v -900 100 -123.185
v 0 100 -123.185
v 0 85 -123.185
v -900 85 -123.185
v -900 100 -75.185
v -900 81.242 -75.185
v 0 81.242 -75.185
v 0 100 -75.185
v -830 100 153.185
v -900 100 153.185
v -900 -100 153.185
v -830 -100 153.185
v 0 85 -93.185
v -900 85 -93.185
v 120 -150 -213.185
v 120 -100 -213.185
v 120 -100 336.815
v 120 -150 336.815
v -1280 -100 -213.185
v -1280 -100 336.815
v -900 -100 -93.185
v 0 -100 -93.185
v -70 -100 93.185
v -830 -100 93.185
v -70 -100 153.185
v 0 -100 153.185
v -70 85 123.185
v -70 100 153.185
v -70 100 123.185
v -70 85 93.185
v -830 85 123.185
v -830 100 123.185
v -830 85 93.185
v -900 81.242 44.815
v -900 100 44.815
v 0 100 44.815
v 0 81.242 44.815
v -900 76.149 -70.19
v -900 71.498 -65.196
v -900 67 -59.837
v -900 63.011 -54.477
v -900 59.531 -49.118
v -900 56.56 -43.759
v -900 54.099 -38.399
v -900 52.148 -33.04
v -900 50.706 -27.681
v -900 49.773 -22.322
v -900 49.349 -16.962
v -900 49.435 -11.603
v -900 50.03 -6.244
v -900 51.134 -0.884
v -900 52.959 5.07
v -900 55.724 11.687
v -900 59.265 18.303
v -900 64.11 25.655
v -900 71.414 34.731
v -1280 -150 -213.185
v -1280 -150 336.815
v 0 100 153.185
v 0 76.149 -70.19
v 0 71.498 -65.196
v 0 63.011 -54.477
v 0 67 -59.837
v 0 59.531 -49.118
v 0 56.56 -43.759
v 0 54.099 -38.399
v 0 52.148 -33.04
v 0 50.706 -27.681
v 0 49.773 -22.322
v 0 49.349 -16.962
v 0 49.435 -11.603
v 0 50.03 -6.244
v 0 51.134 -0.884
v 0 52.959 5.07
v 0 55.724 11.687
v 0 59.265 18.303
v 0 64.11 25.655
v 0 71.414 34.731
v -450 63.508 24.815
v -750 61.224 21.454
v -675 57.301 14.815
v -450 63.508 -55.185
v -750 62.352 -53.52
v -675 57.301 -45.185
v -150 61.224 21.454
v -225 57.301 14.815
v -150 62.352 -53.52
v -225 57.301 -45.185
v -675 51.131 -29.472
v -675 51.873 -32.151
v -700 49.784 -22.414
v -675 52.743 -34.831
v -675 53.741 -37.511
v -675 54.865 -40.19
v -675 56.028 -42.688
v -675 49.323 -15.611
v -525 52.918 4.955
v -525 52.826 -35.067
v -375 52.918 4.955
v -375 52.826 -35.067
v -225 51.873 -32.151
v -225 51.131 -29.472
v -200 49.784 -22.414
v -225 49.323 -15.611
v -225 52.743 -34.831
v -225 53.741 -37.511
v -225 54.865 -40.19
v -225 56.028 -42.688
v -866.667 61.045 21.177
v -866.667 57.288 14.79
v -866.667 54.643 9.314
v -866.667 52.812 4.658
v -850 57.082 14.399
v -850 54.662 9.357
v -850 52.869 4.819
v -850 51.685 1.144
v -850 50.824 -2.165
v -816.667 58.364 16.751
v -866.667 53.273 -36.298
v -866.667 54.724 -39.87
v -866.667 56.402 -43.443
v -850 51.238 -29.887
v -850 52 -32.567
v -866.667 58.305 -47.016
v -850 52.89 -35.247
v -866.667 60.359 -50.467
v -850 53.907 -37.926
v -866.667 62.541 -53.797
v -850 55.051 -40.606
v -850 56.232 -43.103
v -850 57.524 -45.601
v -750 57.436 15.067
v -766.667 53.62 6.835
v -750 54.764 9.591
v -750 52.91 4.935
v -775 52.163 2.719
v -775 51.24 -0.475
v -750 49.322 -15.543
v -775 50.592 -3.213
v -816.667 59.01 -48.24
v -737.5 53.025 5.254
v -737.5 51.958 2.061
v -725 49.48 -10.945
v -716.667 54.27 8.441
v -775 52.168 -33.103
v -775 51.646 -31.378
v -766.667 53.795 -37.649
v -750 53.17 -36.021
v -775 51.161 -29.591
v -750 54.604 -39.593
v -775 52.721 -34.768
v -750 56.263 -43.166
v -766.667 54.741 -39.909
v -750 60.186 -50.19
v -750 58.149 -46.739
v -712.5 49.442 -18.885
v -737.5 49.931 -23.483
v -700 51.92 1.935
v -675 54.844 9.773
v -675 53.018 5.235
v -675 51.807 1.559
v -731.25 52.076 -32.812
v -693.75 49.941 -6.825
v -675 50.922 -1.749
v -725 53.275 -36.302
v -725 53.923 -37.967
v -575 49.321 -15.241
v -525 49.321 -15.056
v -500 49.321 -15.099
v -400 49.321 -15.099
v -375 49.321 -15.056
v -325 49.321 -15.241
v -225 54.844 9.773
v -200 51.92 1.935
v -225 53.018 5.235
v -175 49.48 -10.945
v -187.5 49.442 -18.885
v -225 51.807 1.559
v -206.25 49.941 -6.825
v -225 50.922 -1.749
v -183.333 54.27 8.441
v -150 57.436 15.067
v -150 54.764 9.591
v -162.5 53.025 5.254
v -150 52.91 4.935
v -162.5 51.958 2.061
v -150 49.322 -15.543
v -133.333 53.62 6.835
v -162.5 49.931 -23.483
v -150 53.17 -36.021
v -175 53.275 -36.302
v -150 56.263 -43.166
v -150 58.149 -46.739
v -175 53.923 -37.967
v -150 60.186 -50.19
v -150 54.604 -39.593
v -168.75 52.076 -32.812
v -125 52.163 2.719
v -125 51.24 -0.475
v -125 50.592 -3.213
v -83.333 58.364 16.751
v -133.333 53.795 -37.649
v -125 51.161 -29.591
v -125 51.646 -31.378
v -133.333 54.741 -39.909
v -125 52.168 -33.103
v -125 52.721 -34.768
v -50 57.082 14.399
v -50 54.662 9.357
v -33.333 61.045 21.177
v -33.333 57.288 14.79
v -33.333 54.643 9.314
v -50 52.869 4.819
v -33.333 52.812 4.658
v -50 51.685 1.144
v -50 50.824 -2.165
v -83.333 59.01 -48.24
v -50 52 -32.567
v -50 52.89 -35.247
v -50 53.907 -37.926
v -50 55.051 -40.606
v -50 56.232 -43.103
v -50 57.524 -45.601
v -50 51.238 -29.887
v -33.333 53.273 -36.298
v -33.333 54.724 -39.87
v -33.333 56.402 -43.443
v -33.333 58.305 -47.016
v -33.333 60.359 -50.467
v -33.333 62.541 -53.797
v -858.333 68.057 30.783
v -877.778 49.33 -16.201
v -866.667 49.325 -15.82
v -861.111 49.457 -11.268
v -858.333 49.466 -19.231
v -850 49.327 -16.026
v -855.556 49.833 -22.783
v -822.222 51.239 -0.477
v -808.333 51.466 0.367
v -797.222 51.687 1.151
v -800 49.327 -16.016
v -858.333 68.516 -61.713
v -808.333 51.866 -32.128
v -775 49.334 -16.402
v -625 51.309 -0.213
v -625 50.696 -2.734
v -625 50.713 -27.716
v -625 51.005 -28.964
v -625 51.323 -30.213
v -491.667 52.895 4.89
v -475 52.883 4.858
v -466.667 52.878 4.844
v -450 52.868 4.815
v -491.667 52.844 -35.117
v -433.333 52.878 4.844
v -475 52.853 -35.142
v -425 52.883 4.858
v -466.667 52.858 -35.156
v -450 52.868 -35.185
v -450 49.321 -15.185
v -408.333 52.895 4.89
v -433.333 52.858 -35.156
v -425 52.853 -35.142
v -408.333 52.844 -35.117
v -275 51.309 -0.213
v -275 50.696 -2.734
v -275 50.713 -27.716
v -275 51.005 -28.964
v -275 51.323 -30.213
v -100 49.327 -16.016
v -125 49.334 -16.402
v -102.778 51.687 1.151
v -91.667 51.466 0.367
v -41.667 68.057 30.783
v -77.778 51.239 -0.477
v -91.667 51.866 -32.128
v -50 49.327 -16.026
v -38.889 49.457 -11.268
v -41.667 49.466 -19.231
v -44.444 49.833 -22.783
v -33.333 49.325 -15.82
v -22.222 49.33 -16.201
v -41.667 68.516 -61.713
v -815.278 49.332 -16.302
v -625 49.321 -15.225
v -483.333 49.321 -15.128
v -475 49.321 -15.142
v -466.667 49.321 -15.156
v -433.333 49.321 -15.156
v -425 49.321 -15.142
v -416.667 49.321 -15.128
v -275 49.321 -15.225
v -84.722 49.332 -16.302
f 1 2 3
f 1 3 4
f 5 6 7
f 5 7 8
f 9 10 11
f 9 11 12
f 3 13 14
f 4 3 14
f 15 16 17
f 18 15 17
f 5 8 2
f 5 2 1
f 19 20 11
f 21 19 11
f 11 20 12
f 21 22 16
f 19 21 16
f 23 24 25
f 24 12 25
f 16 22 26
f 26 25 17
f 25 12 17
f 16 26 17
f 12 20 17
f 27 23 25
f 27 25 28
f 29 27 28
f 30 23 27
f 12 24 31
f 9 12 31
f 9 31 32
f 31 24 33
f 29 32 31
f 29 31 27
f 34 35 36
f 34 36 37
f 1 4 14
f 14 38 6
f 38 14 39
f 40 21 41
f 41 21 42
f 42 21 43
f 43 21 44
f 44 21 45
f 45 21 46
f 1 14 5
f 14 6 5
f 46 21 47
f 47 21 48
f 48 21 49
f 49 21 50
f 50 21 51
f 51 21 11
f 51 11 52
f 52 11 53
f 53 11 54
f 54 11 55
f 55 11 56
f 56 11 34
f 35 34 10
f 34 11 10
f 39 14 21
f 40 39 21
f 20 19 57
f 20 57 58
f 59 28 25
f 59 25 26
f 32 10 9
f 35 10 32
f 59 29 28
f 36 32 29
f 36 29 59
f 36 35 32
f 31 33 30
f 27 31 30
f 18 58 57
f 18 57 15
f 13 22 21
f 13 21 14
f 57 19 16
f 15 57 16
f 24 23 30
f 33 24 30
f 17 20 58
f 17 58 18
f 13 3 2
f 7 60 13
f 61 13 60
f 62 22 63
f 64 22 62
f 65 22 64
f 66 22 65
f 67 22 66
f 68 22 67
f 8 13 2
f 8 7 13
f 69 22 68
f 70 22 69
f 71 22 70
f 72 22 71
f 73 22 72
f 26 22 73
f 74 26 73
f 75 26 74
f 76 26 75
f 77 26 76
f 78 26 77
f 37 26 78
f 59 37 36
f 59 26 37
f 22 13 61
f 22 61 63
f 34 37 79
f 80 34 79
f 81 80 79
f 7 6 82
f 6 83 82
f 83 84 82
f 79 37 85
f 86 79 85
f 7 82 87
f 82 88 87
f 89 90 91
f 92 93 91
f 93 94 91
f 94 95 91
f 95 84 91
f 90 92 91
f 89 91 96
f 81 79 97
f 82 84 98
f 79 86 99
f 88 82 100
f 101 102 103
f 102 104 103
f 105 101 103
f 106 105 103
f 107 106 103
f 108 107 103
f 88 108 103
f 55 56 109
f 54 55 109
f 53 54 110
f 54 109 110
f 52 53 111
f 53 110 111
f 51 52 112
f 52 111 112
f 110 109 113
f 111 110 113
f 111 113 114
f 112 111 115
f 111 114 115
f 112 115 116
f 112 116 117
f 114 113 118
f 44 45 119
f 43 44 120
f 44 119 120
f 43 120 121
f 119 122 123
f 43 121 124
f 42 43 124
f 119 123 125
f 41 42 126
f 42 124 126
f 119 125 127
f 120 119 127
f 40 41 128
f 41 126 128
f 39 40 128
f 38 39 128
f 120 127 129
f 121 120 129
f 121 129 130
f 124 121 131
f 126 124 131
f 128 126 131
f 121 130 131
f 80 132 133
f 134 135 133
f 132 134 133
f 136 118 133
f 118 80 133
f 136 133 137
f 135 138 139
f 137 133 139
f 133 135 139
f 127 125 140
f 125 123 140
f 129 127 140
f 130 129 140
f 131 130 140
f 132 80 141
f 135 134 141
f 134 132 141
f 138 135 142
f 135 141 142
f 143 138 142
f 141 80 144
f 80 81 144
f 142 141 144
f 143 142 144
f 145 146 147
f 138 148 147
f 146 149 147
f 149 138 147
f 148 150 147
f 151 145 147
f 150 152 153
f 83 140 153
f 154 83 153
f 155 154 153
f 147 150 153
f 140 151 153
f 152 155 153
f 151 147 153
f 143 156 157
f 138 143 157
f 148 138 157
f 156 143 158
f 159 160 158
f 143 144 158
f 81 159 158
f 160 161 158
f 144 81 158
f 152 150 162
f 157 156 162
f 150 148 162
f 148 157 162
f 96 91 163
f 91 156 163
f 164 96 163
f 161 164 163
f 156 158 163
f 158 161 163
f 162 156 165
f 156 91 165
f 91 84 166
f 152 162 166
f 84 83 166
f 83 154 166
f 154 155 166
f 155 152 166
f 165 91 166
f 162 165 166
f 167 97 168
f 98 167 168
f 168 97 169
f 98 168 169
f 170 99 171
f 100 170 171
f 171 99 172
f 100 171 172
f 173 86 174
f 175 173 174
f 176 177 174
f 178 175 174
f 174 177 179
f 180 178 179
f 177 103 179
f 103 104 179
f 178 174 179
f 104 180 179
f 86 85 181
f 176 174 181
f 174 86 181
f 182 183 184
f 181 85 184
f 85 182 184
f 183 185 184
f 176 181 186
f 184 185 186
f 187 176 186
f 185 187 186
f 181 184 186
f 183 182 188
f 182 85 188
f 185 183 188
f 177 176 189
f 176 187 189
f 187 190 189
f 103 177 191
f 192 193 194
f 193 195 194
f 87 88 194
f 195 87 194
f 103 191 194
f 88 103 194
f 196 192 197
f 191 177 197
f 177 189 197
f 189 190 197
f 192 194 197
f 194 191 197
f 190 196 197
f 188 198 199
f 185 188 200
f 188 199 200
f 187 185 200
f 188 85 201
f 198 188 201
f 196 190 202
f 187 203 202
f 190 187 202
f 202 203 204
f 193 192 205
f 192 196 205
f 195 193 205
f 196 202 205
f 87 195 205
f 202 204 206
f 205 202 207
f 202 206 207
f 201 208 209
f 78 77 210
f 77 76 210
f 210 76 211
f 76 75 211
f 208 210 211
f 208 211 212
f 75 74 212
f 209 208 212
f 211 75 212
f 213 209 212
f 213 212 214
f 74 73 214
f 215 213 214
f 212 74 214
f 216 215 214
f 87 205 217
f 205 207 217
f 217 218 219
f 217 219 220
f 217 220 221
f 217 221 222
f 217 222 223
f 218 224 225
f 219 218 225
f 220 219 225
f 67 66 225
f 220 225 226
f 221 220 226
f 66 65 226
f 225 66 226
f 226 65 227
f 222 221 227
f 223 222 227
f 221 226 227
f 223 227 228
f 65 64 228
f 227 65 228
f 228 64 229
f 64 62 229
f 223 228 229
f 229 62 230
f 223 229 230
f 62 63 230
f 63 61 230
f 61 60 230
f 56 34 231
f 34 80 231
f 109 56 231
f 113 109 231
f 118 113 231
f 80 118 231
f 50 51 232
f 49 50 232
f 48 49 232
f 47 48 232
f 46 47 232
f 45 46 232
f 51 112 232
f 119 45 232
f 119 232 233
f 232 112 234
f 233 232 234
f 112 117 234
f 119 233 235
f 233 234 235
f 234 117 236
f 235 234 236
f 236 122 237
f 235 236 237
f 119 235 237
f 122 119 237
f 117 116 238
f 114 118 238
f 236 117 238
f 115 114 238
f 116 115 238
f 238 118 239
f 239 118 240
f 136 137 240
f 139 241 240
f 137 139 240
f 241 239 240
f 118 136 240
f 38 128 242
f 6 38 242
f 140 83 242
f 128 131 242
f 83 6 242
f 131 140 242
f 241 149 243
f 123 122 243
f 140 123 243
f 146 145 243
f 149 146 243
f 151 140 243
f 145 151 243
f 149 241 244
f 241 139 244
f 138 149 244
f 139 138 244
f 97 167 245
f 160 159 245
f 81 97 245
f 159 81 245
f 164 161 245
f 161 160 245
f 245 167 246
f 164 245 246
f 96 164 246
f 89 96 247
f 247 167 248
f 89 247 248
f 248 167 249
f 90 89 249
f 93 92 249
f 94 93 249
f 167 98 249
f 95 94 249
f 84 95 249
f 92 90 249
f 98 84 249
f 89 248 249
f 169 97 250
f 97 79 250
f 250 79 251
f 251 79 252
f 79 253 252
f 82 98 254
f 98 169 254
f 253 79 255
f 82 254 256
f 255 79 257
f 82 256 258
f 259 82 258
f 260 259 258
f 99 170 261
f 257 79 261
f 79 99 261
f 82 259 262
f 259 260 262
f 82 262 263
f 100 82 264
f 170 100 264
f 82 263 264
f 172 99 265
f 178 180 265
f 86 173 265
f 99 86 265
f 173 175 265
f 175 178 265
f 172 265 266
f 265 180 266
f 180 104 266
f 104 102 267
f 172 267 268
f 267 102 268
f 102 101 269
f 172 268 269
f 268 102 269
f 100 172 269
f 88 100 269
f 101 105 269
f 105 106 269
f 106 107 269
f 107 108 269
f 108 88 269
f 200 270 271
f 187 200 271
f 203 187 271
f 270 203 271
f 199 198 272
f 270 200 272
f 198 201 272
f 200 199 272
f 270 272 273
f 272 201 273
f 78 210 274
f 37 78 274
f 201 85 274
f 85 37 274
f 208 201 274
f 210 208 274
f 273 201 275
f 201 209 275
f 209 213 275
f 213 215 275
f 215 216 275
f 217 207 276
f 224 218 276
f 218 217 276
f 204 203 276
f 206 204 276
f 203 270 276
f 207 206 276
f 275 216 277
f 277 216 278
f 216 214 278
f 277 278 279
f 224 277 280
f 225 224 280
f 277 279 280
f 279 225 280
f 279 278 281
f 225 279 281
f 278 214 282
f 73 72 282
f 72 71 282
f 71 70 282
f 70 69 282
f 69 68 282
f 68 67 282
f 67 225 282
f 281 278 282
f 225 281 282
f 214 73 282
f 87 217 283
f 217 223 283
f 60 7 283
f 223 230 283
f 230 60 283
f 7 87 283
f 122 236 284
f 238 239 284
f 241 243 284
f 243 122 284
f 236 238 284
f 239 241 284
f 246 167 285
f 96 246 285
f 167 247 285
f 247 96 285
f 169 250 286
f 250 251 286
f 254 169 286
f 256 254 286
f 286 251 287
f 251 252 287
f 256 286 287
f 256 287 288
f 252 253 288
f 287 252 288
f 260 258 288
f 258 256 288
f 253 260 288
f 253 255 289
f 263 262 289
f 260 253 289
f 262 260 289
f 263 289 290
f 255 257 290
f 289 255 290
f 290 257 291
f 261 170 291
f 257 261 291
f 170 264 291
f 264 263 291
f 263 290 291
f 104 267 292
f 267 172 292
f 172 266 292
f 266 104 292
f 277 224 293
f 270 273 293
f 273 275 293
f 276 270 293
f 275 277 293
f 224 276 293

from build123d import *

# Parameters (mm, degrees)
SKETCH2_W           = 186.37
SKETCH2_H           = 200
BOSS_EXTRUDE2_DEPTH = 900
SKETCH3_W           = 70
SKETCH3_H           = 200
BOSS_EXTRUDE3_DEPTH = 60
SKETCH4_W           = 1400
SKETCH4_H           = 550
BOSS_EXTRUDE4_DEPTH = 50
CUT_EXTRUDE1_DEPTH  = 900
SKETCH7_W           = 900
SKETCH7_H           = 15
BOSS_EXTRUDE5_DEPTH = 30
SKETCH8_W           = 760
SKETCH8_H           = 15
BOSS_EXTRUDE6_DEPTH = 30


with BuildPart() as part:
    # Sketch2 → Boss-Extrude2 (new body)
    with BuildSketch(Plane(origin=(0, 0, 0), x_dir=(0, 0, -1), z_dir=(1, 0, 0))):
        Rectangle(SKETCH2_W, SKETCH2_H)
    extrude(amount=-BOSS_EXTRUDE2_DEPTH)

    # Sketch3 → Boss-Extrude3 (add)
    with BuildSketch(Plane.XY.offset(93.185)):
        with Locations((-35, 0)):
            Rectangle(SKETCH3_W, SKETCH3_H)
        with Locations((-865, 0)):
            Rectangle(SKETCH3_W, SKETCH3_H)
    extrude(amount=BOSS_EXTRUDE3_DEPTH)

    # Sketch4 → Boss-Extrude4 (add)
    with BuildSketch(Plane.XZ.offset(100)):
        with Locations((-580, 61.815)):
            Rectangle(SKETCH4_W, SKETCH4_H)
    extrude(amount=BOSS_EXTRUDE4_DEPTH)

    # Sketch6 → Cut-Extrude1 (cut)
    with BuildSketch(Plane(origin=(0, 0, 0), x_dir=(0, 0, -1), z_dir=(1, 0, 0))):
        with BuildLine():
            Line((-44.815, 100), (-44.815, 81.242091756))
            add(Edge.make_bspline(
                [(-44.815, 81.242091756), (15.185, 17.399871026), (75.185, 81.242091756)],
                knots=[0, 0, 0, 1, 1, 1], degree=2))
            Line((75.185, 81.242091756), (75.185, 100))
            Line((75.185, 100), (-44.815, 100))
        make_face()
    extrude(amount=-CUT_EXTRUDE1_DEPTH, mode=Mode.SUBTRACT)

    # Sketch7 → Boss-Extrude5 (add)
    with BuildSketch(Plane(origin=(0, 0, -93.185), x_dir=(-1, 0, 0), z_dir=(0, 0, -1))):
        with Locations((450, 92.5)):
            Rectangle(SKETCH7_W, SKETCH7_H)
    extrude(amount=BOSS_EXTRUDE5_DEPTH)

    # Sketch8 → Boss-Extrude6 (add)
    with BuildSketch(Plane.XY.offset(93.185)):
        with Locations((-450, 92.5)):
            Rectangle(SKETCH8_W, SKETCH8_H)
    extrude(amount=BOSS_EXTRUDE6_DEPTH)


solid = part.part
